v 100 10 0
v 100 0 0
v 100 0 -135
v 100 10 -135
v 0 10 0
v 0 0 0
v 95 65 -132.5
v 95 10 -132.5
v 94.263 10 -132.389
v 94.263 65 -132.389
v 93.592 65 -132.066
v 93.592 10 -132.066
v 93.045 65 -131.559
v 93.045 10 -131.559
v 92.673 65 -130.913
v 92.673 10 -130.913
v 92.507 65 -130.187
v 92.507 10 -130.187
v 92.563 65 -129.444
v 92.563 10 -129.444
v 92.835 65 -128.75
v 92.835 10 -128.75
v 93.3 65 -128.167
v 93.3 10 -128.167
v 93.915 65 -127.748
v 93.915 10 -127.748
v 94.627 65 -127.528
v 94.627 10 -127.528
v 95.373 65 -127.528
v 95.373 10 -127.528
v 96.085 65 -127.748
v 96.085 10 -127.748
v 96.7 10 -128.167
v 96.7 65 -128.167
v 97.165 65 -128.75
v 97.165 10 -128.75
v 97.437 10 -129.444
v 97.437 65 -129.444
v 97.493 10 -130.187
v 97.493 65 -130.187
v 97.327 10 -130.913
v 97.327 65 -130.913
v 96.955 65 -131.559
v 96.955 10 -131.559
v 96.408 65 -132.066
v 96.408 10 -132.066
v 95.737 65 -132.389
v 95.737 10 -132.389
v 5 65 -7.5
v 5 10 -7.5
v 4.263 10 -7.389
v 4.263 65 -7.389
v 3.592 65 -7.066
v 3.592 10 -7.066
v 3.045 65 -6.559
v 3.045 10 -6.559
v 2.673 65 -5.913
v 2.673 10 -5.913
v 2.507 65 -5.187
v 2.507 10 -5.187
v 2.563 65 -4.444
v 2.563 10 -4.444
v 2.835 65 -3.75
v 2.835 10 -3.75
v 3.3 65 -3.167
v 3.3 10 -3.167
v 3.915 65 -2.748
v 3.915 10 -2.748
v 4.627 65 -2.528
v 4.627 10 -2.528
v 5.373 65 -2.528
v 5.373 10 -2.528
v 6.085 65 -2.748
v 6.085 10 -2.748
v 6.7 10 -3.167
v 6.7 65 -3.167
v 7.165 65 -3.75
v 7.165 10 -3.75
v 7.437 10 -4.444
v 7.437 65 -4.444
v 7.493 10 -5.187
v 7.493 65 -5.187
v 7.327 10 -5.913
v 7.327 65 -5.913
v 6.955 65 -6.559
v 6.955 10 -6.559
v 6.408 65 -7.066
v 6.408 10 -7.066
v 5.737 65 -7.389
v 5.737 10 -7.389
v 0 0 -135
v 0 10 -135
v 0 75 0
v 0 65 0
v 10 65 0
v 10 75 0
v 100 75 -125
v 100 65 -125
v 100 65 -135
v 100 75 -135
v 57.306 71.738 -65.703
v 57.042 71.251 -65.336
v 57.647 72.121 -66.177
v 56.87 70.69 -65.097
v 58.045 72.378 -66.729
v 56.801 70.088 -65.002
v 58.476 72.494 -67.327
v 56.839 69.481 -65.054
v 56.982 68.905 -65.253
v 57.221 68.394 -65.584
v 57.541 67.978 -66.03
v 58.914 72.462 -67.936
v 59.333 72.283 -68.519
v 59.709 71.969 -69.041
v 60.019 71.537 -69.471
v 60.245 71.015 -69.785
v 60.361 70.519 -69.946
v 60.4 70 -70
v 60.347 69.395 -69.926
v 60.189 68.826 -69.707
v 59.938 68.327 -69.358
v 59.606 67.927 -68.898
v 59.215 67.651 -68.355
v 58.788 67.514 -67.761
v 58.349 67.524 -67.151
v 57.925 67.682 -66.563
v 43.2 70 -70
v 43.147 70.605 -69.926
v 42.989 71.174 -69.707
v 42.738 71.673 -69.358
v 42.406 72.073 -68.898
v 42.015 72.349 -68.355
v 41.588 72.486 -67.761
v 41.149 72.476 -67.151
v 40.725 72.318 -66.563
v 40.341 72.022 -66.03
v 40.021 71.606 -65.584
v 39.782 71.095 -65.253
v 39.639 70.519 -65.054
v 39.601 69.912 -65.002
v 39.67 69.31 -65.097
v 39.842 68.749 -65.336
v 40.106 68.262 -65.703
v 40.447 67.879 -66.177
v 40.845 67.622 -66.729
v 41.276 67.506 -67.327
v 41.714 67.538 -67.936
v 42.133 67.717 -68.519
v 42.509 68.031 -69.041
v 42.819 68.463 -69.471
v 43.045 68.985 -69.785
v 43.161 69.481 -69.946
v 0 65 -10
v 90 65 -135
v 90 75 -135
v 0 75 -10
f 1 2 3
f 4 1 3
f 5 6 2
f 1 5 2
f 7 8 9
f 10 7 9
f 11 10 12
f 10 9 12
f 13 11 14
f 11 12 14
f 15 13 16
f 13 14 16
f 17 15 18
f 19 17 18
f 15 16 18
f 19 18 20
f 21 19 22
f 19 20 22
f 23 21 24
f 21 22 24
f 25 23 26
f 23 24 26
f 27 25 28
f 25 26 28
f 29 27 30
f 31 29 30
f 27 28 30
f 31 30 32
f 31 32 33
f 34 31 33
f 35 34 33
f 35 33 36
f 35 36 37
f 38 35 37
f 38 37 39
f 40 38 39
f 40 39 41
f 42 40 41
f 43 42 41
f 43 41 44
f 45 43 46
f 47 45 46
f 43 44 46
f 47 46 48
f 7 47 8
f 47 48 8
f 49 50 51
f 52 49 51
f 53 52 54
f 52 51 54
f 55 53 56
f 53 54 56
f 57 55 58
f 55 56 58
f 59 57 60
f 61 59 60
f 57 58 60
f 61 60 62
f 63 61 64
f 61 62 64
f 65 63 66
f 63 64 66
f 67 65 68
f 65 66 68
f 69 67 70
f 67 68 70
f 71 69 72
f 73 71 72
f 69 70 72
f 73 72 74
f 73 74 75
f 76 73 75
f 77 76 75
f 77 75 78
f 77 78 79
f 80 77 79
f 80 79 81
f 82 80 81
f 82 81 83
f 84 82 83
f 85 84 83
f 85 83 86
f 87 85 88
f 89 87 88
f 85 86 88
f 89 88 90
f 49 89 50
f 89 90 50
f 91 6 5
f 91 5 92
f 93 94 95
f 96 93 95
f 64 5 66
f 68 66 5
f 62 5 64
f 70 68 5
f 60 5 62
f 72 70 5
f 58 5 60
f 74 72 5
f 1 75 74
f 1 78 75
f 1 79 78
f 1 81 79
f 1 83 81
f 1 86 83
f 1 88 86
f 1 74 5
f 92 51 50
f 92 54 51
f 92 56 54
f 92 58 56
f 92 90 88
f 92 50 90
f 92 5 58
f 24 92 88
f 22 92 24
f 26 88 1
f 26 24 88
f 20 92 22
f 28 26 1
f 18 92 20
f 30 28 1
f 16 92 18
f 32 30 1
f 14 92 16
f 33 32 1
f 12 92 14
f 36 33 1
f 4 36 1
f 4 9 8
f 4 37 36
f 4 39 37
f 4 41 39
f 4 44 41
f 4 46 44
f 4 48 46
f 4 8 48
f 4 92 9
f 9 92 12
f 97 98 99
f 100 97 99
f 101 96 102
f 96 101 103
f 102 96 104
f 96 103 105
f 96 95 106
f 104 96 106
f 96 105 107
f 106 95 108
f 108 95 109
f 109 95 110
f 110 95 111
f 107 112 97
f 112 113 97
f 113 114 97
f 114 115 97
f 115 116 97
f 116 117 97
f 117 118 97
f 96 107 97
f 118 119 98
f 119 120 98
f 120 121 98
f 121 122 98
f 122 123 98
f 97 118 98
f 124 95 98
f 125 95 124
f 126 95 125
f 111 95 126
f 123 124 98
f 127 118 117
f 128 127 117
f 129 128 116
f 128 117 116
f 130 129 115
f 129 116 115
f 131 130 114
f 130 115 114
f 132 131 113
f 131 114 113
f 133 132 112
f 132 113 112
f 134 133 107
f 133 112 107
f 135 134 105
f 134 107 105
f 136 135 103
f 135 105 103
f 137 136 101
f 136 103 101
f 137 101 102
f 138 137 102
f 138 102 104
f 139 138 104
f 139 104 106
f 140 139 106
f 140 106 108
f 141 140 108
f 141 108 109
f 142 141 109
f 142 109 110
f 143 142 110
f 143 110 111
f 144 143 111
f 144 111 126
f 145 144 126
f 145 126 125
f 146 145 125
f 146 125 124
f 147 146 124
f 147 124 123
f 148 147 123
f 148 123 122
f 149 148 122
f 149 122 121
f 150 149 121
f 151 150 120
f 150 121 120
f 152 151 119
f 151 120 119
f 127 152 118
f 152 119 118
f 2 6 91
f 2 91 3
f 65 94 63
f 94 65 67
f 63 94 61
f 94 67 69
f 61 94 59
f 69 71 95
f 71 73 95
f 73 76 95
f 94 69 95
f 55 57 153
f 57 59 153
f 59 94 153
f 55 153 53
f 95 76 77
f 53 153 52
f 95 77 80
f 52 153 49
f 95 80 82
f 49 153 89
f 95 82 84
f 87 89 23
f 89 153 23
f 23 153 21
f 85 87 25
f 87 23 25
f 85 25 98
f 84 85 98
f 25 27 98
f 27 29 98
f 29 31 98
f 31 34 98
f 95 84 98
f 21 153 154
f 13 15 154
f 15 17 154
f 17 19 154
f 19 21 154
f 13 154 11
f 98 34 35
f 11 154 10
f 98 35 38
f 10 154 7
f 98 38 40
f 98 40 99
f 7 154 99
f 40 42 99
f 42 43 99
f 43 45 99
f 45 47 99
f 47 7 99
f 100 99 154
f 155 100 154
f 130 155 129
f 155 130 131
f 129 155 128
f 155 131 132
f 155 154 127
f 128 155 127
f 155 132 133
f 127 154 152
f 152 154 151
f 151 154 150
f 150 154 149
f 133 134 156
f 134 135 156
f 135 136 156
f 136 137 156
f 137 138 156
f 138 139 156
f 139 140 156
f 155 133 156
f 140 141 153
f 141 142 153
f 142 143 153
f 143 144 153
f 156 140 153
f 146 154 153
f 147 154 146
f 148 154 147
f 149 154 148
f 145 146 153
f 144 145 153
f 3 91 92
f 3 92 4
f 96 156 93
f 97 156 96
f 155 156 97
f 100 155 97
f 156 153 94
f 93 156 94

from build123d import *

# Parameters (mm, degrees)
SKETCH1_W                    = 100
SKETCH1_H                    = 135
BOTTOMPLATE_DEPTH            = 10
SKETCH2_R                    = 2.5
TOPPLATFORMSUPPORT_DEPTH     = 55
TOPTHREADEDRODPLATFORM_DEPTH = 10
CUT_EXTRUDE2_REACH           = 185.984
SKETCH5_R                    = 2.5


with BuildPart() as part:
    # Sketch1 → BottomPlate (new body)
    with BuildSketch(Plane(origin=(0, 0, 0), x_dir=(1, 0, 0), z_dir=(0, 1, 0))):
        with Locations((50, 67.5)):
            Rectangle(SKETCH1_W, SKETCH1_H)
    extrude(amount=BOTTOMPLATE_DEPTH)

    # Sketch2 → TopPlatformSupport (add)
    with BuildSketch(Plane(origin=(0, 10, 0), x_dir=(1, 0, 0), z_dir=(0, 1, 0))):
        with Locations(Location((95, 130, 0), (0, 0, 90))):
            Circle(SKETCH2_R)
        with Locations(Location((5, 5, 0), (0, 0, 90))):
            Circle(SKETCH2_R)
    extrude(amount=TOPPLATFORMSUPPORT_DEPTH)

    # Sketch3 → TopThreadedRodPlatform (add)
    with BuildSketch(Plane(origin=(0, 65, 0), x_dir=(1, 0, 0), z_dir=(0, 1, 0))):
        Polygon((90, 135), (0, 10), (0, 0), (10, 0), (100, 125), (100, 135), align=None)
    extrude(amount=TOPTHREADEDRODPLATFORM_DEPTH)

    # Cut-Extrude2: up to this plane
    cut_extrude2_end = Plane(origin=(90, 75, -135), z_dir=(0.8115343414514944, 0, 0.584304725845076))
    # Sketch5 → Cut-Extrude2 (cut, up to the surface)
    with BuildSketch(Plane(origin=(100, 0, 0), x_dir=(0, 0, -1), z_dir=(1, 0, 0)), mode=Mode.PRIVATE) as cut_extrude2_sk1:
        with Locations((67.5, 70)):
            Circle(SKETCH5_R)
    cut_extrude2_tool1 = split(extrude(cut_extrude2_sk1.sketch, amount=-CUT_EXTRUDE2_REACH, mode=Mode.PRIVATE), bisect_by=cut_extrude2_end, keep=Keep.BOTH, mode=Mode.PRIVATE)
    add(cut_extrude2_tool1.solids().sort_by_distance((100, 70, -67.5))[0], mode=Mode.SUBTRACT)


solid = part.part
